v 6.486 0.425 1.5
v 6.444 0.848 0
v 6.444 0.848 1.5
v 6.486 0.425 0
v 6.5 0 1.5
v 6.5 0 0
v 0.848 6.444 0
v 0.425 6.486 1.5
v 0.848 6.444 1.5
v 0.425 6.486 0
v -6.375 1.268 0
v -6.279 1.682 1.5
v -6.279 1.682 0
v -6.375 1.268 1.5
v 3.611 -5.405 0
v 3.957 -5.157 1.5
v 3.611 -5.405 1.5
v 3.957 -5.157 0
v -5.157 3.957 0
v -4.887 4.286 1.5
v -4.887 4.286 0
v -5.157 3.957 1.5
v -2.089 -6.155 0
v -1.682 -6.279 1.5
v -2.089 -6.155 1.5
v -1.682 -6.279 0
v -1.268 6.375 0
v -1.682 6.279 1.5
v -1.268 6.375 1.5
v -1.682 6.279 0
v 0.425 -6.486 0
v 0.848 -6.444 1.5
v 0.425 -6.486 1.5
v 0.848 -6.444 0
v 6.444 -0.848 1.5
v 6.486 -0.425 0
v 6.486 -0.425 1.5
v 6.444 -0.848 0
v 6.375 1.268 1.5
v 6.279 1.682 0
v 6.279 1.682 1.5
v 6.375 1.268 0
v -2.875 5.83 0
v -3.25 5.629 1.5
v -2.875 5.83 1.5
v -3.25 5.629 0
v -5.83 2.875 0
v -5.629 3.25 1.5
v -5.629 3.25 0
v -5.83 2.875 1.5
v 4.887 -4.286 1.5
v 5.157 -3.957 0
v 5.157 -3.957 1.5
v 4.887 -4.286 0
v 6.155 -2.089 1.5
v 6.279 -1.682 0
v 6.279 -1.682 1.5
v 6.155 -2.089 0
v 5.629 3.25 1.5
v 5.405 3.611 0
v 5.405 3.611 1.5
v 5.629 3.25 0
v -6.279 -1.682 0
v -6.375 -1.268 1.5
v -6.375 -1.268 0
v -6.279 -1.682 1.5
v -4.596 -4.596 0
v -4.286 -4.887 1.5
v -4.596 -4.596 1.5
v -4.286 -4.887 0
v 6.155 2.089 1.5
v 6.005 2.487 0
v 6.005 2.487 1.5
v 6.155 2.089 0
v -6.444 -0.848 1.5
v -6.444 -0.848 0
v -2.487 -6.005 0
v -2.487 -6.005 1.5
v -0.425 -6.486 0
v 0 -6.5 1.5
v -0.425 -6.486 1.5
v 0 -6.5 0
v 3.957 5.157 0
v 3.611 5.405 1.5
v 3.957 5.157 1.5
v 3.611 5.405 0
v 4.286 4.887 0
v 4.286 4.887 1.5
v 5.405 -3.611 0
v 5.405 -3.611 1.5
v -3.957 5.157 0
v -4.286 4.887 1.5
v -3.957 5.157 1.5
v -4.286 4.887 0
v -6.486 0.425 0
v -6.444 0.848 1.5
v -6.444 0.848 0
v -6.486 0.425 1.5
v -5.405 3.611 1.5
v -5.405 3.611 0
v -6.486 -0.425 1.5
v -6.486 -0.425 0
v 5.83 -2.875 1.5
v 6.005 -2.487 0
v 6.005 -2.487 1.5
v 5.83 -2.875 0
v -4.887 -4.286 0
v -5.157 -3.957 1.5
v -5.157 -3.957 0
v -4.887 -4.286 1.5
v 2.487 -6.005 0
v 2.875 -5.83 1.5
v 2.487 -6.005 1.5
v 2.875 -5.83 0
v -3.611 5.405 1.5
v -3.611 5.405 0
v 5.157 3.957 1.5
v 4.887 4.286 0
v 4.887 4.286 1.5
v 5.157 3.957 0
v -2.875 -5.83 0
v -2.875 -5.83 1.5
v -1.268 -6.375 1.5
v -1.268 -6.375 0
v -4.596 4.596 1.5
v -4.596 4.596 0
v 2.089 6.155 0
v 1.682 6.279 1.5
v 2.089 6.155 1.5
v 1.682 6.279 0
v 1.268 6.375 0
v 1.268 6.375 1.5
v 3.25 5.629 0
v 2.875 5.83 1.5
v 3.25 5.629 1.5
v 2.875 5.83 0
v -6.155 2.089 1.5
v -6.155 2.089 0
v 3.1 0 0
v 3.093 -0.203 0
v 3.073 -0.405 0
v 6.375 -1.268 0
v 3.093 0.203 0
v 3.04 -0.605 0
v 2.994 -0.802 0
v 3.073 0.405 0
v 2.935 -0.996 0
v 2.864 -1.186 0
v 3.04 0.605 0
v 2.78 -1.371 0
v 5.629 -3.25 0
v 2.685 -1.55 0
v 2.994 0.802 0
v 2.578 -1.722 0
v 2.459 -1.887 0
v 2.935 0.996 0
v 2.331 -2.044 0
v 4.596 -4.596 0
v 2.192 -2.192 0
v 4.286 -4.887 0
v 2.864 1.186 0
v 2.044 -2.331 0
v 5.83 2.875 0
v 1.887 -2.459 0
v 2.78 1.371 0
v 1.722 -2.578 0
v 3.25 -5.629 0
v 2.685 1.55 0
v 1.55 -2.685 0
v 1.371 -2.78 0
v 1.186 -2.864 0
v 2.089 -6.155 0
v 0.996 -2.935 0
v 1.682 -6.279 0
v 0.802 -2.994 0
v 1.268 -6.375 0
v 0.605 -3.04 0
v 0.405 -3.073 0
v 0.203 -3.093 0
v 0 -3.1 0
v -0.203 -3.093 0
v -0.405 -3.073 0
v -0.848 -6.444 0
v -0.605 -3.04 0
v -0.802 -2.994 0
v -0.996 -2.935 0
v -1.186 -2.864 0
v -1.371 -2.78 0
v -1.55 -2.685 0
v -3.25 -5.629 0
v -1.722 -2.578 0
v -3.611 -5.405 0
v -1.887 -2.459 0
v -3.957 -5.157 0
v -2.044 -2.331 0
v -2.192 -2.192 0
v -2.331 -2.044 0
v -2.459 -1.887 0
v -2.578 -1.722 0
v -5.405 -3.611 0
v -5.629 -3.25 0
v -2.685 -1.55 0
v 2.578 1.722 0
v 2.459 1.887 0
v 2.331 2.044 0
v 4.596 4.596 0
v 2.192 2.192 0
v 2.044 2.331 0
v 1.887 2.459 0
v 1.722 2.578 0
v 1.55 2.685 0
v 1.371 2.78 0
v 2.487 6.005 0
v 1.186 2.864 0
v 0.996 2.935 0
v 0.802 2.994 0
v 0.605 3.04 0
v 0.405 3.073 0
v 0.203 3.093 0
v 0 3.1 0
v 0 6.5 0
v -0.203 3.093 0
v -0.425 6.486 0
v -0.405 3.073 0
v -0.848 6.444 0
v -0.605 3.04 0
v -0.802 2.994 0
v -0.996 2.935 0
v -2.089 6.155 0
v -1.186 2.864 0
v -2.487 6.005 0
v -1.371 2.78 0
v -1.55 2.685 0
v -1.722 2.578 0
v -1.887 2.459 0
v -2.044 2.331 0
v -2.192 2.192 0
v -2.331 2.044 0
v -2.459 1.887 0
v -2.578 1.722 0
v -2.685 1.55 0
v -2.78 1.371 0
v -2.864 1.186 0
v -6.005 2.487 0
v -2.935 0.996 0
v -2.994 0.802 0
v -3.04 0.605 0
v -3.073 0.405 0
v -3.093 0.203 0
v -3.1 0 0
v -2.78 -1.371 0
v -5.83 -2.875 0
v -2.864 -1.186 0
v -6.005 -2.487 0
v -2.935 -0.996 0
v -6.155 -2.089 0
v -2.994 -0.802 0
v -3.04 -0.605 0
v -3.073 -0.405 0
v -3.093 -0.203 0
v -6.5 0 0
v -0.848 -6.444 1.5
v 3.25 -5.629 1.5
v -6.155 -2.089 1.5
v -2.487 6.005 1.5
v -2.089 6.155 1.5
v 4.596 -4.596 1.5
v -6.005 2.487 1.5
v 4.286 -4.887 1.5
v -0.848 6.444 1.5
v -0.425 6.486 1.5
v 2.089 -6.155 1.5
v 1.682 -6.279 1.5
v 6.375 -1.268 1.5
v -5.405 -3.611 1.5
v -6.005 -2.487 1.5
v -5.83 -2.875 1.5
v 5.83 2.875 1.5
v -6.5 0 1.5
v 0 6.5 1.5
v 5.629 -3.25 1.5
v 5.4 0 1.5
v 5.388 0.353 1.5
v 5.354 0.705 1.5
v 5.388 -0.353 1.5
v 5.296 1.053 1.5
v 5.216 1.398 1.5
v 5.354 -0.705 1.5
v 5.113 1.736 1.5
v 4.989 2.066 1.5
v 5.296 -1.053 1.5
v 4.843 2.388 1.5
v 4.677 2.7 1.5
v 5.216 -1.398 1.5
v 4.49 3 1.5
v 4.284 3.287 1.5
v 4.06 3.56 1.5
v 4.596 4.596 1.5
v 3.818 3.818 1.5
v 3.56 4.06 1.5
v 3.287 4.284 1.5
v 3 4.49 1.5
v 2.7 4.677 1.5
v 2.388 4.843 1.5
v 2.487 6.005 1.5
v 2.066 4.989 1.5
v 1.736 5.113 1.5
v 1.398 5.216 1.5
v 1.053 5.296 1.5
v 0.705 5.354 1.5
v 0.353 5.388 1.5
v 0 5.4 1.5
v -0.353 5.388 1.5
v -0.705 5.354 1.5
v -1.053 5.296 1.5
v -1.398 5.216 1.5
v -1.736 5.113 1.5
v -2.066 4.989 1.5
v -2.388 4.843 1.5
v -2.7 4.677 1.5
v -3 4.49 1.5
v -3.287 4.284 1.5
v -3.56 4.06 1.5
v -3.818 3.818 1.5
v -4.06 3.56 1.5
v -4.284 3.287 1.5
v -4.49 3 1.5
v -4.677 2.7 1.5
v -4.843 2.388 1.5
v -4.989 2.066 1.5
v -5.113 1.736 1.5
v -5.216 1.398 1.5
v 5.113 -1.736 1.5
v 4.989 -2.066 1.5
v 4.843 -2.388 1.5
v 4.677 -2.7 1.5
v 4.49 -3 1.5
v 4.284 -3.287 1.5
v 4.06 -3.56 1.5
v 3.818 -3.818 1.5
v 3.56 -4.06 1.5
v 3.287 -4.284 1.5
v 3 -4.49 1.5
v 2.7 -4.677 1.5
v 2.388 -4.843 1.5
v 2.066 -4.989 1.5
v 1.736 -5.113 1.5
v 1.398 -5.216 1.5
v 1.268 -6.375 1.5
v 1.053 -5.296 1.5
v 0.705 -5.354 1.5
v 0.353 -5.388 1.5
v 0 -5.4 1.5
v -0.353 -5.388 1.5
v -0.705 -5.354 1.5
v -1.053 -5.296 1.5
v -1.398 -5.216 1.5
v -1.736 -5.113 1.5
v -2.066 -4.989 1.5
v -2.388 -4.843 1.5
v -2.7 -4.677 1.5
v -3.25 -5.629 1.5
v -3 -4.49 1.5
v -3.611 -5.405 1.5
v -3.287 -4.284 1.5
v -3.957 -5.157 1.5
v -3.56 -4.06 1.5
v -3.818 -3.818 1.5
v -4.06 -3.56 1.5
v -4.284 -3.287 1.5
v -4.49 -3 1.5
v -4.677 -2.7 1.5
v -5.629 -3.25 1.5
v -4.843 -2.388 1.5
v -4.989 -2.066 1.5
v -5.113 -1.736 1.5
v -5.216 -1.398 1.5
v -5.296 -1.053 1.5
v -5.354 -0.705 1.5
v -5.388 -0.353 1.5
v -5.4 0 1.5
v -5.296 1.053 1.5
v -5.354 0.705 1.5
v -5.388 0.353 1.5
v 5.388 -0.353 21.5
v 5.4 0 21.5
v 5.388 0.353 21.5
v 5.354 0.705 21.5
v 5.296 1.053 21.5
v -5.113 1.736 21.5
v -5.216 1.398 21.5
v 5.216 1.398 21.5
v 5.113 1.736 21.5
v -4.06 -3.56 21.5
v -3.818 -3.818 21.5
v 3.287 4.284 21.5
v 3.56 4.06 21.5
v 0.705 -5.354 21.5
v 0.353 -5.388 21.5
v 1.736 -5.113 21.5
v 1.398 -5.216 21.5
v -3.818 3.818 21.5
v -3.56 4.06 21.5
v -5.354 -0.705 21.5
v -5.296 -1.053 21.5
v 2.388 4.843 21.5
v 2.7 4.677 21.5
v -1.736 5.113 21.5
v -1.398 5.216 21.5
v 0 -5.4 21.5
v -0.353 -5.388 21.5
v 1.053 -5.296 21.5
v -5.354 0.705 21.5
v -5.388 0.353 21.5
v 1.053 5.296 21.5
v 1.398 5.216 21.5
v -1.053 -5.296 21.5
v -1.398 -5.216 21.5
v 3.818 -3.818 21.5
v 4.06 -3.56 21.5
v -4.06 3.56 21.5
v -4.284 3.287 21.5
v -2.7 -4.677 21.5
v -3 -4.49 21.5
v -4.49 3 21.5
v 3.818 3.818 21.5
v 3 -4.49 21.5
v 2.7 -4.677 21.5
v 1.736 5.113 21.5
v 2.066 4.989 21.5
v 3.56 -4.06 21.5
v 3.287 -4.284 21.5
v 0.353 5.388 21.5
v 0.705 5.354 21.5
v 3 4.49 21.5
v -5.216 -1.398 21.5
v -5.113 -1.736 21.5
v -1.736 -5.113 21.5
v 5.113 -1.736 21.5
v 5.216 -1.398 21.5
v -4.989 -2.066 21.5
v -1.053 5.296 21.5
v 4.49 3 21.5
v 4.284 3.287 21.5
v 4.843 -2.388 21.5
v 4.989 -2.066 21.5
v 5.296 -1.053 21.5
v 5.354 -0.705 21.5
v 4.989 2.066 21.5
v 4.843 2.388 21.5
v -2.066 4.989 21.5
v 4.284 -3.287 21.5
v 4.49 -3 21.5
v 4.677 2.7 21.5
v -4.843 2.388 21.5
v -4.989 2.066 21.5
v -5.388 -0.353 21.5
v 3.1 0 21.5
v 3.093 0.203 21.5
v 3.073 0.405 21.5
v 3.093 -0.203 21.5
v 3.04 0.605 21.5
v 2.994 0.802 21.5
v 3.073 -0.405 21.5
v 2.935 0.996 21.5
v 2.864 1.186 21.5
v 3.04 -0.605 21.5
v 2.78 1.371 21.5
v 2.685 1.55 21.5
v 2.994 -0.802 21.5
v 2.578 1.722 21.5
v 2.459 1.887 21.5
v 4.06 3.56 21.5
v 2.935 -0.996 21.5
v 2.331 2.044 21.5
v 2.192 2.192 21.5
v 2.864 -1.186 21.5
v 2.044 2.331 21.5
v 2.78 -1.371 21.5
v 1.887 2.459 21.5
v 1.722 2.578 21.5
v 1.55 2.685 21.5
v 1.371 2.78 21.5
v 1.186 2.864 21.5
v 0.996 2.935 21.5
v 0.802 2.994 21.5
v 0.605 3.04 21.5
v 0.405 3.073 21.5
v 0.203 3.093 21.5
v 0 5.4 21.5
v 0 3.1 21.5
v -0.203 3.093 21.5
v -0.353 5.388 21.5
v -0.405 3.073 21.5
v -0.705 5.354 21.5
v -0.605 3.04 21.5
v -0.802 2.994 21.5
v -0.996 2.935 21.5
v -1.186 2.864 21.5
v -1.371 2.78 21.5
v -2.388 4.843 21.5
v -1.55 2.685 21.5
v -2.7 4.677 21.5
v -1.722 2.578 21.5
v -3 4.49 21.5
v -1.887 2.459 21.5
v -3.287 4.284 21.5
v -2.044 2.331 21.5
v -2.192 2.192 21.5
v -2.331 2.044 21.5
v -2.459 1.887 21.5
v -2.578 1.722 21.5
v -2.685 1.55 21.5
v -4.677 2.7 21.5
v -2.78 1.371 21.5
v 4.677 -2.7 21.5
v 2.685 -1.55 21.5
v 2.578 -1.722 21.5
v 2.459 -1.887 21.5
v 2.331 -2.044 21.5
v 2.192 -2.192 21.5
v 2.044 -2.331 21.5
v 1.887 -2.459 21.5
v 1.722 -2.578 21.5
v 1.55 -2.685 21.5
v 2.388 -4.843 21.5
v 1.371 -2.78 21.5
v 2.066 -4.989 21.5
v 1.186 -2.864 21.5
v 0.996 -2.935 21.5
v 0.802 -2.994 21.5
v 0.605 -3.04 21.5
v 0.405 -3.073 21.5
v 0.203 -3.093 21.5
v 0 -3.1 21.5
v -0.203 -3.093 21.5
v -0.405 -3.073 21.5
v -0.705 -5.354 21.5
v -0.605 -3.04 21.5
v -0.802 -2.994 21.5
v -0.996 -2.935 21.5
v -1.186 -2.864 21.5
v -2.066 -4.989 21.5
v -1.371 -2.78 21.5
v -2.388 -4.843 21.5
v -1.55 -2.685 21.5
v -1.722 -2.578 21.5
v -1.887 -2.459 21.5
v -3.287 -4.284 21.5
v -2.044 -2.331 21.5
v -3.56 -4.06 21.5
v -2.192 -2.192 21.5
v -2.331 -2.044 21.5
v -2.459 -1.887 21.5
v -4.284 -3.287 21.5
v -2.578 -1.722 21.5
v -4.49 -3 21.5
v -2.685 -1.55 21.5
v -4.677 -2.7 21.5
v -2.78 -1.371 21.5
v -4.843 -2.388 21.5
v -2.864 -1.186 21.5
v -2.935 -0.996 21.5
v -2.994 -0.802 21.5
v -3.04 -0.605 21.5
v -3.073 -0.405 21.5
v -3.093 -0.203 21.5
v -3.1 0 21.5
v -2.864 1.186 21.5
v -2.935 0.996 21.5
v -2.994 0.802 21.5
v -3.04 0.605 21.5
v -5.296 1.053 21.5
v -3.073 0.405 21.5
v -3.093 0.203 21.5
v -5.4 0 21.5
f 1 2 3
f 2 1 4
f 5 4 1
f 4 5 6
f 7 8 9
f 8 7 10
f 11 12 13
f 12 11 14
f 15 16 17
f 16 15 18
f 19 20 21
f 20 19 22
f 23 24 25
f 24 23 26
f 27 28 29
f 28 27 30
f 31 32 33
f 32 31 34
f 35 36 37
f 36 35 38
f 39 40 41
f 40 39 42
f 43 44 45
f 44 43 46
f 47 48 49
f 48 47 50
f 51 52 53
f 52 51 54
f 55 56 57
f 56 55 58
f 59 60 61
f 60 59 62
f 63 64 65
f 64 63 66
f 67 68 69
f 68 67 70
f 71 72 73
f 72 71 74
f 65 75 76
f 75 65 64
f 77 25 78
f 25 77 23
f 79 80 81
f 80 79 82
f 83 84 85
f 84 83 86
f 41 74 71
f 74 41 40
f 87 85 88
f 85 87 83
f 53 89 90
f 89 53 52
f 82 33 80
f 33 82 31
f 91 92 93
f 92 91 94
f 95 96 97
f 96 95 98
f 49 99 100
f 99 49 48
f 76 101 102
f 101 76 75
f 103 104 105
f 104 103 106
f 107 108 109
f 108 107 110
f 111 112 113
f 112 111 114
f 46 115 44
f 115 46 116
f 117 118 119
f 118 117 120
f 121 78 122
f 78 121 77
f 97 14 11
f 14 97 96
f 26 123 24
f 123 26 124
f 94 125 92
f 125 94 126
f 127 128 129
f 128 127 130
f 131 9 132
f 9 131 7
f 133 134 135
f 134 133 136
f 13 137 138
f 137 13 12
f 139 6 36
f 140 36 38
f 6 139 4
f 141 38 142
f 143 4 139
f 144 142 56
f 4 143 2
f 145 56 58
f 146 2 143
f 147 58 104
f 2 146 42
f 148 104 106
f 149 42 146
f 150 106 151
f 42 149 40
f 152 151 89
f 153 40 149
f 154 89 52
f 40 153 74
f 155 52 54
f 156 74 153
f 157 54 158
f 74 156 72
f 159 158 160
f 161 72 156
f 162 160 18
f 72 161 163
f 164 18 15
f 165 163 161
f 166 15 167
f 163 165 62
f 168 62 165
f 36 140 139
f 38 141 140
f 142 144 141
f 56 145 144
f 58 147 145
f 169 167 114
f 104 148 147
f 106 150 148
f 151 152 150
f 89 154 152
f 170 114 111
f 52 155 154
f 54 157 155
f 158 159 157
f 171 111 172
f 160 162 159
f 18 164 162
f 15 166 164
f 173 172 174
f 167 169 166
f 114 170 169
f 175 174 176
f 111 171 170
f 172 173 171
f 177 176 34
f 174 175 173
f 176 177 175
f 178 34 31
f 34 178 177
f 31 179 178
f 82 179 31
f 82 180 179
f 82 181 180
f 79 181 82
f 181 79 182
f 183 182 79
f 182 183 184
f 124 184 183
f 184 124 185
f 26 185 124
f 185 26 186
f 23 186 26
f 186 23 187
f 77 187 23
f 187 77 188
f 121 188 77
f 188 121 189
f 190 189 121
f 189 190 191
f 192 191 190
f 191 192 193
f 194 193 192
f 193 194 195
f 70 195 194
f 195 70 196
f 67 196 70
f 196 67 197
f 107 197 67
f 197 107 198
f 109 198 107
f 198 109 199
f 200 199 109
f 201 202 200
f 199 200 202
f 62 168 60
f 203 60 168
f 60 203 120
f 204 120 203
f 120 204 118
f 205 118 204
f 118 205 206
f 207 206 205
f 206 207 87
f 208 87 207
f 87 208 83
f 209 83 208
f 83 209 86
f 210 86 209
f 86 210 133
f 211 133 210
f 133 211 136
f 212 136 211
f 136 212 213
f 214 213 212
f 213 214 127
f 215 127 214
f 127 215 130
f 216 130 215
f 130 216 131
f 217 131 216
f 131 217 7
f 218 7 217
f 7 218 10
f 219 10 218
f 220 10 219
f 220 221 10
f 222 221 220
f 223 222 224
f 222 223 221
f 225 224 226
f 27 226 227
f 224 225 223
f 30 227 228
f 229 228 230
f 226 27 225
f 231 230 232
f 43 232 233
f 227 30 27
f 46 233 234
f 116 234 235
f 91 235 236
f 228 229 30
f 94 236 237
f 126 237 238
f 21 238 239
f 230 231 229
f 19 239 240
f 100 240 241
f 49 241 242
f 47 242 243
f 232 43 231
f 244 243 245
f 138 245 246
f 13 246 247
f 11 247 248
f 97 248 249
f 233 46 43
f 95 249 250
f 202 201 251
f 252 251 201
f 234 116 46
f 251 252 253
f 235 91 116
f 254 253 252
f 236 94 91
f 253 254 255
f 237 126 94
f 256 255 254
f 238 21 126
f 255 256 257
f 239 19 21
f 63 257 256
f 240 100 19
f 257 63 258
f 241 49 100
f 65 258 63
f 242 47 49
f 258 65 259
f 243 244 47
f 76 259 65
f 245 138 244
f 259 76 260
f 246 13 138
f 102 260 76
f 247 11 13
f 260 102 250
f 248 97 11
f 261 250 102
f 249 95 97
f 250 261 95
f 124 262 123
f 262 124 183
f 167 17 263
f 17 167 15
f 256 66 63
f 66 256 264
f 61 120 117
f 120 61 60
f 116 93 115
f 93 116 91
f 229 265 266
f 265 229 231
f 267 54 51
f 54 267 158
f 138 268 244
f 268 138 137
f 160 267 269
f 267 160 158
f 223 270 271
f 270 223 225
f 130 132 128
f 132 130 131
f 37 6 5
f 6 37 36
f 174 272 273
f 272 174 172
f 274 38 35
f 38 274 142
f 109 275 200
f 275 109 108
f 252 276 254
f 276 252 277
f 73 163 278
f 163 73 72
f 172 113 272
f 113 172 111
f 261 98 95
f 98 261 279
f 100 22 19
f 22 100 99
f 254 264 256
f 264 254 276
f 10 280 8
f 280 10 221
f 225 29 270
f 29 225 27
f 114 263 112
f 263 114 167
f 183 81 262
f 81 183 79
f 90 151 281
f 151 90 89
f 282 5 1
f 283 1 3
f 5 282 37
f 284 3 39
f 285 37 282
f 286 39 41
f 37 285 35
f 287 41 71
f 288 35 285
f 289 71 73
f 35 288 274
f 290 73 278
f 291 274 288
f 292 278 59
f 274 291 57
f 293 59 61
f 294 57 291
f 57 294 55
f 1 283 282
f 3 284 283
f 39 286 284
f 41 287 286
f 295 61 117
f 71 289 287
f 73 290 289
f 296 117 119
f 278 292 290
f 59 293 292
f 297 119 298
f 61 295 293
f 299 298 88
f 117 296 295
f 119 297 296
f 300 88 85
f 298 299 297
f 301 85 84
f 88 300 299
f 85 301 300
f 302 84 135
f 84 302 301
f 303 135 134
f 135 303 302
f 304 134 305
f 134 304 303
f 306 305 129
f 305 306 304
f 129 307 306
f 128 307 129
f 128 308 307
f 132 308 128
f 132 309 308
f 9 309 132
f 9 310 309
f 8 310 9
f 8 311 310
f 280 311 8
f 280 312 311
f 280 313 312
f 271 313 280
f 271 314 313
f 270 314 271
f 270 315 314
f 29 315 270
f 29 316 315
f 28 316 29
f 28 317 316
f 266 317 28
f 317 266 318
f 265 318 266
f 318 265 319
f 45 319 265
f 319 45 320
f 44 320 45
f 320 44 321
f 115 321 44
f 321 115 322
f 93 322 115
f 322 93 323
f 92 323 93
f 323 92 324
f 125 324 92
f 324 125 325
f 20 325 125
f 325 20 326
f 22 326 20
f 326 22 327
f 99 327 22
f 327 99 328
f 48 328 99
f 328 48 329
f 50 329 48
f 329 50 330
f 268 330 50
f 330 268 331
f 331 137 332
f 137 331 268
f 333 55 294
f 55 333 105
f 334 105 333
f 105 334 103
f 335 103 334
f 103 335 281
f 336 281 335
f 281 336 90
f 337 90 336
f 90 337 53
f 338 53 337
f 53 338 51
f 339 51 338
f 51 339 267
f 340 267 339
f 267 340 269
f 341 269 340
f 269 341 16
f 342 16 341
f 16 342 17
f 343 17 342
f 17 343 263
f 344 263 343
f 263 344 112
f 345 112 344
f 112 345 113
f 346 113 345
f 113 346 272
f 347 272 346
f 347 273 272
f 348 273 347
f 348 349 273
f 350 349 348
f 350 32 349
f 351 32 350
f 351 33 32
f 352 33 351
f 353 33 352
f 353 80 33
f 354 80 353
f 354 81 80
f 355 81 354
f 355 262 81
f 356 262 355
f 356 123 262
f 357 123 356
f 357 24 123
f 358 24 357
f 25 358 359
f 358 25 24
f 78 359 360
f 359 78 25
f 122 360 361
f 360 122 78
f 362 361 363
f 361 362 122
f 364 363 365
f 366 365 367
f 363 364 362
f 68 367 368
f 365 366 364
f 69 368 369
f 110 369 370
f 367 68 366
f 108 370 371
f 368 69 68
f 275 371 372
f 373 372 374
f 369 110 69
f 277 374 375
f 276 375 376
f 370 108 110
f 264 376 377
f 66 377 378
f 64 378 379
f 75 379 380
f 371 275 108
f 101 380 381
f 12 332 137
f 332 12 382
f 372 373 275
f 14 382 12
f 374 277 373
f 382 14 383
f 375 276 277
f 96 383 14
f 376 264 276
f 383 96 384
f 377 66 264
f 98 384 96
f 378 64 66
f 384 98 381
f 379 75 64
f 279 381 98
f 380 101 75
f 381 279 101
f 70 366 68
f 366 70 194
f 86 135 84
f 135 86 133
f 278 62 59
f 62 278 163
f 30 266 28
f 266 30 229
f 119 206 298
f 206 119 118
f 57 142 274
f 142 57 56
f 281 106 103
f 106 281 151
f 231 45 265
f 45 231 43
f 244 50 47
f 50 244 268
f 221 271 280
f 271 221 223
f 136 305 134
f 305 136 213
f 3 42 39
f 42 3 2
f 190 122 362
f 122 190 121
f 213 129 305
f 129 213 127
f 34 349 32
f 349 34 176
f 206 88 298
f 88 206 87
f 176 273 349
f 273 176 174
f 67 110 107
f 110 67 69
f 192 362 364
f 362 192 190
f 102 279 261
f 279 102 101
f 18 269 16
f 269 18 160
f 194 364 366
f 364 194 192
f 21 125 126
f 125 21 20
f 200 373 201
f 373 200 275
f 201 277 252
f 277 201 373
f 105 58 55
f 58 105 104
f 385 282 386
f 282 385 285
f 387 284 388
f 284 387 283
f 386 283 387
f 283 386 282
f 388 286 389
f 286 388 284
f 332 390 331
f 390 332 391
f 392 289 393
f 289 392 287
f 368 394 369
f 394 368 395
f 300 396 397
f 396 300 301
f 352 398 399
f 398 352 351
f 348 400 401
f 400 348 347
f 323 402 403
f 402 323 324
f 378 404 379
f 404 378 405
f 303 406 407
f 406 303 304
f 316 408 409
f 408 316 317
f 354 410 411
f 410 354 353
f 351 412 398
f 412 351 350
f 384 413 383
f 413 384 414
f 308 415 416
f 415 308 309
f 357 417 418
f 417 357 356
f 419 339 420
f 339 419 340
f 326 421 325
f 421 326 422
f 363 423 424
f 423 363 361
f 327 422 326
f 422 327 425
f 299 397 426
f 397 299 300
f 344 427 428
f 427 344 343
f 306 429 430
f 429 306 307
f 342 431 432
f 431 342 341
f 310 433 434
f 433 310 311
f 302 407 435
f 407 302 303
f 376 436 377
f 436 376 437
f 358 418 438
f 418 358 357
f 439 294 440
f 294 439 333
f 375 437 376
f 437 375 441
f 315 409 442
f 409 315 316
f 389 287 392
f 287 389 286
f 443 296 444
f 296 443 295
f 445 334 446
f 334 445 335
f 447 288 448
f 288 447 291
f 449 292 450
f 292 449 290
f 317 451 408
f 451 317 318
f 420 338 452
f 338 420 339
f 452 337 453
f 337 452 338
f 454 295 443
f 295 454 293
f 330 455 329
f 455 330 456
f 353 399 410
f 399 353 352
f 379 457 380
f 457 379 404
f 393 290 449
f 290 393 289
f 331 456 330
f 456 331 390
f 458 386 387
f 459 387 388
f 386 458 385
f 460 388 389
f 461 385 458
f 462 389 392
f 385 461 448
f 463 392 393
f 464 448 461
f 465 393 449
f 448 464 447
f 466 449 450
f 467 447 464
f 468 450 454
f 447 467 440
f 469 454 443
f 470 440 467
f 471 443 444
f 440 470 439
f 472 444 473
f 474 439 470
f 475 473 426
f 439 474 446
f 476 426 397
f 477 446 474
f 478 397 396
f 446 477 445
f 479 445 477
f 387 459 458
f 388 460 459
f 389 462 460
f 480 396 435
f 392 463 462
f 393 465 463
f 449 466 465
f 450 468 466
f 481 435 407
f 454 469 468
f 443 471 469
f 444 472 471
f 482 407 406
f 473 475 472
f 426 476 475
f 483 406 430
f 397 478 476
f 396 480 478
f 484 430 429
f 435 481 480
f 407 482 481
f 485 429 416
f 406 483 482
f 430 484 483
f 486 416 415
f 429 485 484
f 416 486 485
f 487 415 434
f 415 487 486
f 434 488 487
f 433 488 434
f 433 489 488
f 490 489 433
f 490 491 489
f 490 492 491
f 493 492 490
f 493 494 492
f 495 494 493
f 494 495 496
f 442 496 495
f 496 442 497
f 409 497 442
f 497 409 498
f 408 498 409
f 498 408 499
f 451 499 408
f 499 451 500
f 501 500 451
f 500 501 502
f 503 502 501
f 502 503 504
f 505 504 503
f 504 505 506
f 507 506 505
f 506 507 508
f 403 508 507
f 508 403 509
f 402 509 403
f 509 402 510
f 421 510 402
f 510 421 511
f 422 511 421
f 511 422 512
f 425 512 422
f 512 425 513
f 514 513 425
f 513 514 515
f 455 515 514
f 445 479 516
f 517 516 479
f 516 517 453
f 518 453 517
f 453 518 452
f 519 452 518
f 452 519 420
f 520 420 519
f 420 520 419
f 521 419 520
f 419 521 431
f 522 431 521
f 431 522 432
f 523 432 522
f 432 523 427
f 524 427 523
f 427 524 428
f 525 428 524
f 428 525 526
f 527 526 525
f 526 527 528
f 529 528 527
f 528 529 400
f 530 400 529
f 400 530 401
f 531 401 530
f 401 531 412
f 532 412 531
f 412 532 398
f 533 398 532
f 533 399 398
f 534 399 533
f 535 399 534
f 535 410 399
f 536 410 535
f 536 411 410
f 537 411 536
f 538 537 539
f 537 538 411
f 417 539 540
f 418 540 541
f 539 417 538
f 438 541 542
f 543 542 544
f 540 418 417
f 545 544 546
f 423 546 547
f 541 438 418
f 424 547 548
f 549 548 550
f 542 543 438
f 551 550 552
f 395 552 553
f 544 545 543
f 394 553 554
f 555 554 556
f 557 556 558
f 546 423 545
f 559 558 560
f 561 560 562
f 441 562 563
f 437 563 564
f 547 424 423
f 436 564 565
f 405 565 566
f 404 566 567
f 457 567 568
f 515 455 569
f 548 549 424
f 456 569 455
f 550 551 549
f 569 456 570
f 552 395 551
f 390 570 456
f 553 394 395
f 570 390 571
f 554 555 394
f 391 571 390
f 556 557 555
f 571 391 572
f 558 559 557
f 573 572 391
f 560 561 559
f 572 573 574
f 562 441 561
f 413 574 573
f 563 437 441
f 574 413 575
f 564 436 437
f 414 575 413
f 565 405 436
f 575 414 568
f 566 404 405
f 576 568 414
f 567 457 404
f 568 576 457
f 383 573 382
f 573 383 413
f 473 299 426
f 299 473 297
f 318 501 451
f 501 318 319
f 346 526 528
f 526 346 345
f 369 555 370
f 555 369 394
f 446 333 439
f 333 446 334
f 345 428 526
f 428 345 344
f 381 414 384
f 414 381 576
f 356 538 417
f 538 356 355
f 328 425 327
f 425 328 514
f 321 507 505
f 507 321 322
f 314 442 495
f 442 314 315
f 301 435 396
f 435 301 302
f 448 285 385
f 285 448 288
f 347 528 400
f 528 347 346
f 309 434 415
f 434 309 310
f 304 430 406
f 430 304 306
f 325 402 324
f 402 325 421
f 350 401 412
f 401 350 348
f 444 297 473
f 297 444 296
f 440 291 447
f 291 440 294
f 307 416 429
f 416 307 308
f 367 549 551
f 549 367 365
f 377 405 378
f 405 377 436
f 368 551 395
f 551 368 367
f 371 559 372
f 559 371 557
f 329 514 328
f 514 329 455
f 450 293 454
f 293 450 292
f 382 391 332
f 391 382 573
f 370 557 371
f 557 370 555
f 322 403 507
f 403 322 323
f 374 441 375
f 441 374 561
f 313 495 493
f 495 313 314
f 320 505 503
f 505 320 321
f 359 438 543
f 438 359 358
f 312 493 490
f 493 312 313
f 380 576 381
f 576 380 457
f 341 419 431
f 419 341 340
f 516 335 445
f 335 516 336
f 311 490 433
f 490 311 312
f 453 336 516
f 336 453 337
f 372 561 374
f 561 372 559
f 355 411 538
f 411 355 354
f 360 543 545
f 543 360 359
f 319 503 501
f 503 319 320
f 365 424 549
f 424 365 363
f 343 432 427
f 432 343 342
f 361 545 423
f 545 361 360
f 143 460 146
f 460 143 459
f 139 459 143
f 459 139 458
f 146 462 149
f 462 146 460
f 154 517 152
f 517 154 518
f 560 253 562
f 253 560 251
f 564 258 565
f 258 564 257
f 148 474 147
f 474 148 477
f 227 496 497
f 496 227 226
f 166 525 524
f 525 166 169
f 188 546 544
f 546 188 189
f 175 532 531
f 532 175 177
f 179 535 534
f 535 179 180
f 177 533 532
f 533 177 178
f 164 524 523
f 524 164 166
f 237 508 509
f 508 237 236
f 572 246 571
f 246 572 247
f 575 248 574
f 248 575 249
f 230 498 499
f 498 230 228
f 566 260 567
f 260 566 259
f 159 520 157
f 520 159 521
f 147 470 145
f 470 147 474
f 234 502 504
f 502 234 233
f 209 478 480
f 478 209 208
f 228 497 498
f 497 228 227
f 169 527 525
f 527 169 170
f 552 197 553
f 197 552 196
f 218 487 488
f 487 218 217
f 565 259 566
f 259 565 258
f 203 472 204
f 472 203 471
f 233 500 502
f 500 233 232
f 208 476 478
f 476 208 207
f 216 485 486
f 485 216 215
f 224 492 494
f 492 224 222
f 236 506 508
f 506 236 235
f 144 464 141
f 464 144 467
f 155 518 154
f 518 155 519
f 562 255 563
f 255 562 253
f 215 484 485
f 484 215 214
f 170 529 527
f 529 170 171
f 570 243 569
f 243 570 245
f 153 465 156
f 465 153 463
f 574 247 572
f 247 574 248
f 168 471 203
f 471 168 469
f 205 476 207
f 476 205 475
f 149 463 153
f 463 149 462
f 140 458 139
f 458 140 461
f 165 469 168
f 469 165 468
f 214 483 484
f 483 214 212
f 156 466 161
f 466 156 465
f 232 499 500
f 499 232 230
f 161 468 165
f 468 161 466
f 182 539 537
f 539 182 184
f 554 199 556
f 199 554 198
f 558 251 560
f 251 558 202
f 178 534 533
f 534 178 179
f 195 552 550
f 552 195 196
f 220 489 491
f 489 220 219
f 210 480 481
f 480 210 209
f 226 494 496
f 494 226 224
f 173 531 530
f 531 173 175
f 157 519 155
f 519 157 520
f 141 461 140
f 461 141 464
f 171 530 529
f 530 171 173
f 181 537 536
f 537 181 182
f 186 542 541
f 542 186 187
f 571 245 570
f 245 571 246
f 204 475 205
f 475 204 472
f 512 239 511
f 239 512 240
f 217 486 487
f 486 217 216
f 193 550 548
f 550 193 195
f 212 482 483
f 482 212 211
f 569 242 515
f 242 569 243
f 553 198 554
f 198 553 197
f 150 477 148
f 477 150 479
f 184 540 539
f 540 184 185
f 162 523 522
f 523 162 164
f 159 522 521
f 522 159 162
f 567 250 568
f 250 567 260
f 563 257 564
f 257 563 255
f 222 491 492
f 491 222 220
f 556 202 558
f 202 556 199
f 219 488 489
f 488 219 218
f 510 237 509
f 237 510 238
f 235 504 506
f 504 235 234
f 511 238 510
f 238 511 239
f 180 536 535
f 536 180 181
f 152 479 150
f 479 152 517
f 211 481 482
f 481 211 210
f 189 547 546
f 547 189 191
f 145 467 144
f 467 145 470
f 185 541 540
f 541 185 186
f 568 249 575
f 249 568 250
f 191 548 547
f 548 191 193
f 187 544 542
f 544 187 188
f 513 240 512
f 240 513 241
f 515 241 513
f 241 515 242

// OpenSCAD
// PCR tube adapter sleeve: 0.2 mL tube in a 1.5 mL rack hole
// Print orientation: collar on the bed (z = 0), sleeve body rises to z = 21.5

// ---------------- Parameters ----------------
collar_d      = 13;    // collar outer diameter (mm)
collar_h      = 1.5;   // collar thickness (mm)
sleeve_od     = 10.8;  // sleeve body outer diameter (mm)
sleeve_h      = 20;    // sleeve body height above collar (mm)
bore_d        = 6.2;   // through-bore diameter (mm)
eps           = 0.5;   // cutter overshoot past faces (mm)
$fn           = 96;    // curve resolution

total_h = collar_h + sleeve_h;  // 21.5 mm overall height

// ---------------- Model ----------------
difference() {
    union() {
        // Collar
        cylinder(d = collar_d, h = collar_h);
        // Sleeve body (slightly overlapping the collar for a clean union)
        translate([0, 0, collar_h - 0.01])
            cylinder(d = sleeve_od, h = sleeve_h + 0.01);
    }
    // Straight through-bore
    translate([0, 0, -eps])
        cylinder(d = bore_d, h = total_h + 2 * eps);
}
